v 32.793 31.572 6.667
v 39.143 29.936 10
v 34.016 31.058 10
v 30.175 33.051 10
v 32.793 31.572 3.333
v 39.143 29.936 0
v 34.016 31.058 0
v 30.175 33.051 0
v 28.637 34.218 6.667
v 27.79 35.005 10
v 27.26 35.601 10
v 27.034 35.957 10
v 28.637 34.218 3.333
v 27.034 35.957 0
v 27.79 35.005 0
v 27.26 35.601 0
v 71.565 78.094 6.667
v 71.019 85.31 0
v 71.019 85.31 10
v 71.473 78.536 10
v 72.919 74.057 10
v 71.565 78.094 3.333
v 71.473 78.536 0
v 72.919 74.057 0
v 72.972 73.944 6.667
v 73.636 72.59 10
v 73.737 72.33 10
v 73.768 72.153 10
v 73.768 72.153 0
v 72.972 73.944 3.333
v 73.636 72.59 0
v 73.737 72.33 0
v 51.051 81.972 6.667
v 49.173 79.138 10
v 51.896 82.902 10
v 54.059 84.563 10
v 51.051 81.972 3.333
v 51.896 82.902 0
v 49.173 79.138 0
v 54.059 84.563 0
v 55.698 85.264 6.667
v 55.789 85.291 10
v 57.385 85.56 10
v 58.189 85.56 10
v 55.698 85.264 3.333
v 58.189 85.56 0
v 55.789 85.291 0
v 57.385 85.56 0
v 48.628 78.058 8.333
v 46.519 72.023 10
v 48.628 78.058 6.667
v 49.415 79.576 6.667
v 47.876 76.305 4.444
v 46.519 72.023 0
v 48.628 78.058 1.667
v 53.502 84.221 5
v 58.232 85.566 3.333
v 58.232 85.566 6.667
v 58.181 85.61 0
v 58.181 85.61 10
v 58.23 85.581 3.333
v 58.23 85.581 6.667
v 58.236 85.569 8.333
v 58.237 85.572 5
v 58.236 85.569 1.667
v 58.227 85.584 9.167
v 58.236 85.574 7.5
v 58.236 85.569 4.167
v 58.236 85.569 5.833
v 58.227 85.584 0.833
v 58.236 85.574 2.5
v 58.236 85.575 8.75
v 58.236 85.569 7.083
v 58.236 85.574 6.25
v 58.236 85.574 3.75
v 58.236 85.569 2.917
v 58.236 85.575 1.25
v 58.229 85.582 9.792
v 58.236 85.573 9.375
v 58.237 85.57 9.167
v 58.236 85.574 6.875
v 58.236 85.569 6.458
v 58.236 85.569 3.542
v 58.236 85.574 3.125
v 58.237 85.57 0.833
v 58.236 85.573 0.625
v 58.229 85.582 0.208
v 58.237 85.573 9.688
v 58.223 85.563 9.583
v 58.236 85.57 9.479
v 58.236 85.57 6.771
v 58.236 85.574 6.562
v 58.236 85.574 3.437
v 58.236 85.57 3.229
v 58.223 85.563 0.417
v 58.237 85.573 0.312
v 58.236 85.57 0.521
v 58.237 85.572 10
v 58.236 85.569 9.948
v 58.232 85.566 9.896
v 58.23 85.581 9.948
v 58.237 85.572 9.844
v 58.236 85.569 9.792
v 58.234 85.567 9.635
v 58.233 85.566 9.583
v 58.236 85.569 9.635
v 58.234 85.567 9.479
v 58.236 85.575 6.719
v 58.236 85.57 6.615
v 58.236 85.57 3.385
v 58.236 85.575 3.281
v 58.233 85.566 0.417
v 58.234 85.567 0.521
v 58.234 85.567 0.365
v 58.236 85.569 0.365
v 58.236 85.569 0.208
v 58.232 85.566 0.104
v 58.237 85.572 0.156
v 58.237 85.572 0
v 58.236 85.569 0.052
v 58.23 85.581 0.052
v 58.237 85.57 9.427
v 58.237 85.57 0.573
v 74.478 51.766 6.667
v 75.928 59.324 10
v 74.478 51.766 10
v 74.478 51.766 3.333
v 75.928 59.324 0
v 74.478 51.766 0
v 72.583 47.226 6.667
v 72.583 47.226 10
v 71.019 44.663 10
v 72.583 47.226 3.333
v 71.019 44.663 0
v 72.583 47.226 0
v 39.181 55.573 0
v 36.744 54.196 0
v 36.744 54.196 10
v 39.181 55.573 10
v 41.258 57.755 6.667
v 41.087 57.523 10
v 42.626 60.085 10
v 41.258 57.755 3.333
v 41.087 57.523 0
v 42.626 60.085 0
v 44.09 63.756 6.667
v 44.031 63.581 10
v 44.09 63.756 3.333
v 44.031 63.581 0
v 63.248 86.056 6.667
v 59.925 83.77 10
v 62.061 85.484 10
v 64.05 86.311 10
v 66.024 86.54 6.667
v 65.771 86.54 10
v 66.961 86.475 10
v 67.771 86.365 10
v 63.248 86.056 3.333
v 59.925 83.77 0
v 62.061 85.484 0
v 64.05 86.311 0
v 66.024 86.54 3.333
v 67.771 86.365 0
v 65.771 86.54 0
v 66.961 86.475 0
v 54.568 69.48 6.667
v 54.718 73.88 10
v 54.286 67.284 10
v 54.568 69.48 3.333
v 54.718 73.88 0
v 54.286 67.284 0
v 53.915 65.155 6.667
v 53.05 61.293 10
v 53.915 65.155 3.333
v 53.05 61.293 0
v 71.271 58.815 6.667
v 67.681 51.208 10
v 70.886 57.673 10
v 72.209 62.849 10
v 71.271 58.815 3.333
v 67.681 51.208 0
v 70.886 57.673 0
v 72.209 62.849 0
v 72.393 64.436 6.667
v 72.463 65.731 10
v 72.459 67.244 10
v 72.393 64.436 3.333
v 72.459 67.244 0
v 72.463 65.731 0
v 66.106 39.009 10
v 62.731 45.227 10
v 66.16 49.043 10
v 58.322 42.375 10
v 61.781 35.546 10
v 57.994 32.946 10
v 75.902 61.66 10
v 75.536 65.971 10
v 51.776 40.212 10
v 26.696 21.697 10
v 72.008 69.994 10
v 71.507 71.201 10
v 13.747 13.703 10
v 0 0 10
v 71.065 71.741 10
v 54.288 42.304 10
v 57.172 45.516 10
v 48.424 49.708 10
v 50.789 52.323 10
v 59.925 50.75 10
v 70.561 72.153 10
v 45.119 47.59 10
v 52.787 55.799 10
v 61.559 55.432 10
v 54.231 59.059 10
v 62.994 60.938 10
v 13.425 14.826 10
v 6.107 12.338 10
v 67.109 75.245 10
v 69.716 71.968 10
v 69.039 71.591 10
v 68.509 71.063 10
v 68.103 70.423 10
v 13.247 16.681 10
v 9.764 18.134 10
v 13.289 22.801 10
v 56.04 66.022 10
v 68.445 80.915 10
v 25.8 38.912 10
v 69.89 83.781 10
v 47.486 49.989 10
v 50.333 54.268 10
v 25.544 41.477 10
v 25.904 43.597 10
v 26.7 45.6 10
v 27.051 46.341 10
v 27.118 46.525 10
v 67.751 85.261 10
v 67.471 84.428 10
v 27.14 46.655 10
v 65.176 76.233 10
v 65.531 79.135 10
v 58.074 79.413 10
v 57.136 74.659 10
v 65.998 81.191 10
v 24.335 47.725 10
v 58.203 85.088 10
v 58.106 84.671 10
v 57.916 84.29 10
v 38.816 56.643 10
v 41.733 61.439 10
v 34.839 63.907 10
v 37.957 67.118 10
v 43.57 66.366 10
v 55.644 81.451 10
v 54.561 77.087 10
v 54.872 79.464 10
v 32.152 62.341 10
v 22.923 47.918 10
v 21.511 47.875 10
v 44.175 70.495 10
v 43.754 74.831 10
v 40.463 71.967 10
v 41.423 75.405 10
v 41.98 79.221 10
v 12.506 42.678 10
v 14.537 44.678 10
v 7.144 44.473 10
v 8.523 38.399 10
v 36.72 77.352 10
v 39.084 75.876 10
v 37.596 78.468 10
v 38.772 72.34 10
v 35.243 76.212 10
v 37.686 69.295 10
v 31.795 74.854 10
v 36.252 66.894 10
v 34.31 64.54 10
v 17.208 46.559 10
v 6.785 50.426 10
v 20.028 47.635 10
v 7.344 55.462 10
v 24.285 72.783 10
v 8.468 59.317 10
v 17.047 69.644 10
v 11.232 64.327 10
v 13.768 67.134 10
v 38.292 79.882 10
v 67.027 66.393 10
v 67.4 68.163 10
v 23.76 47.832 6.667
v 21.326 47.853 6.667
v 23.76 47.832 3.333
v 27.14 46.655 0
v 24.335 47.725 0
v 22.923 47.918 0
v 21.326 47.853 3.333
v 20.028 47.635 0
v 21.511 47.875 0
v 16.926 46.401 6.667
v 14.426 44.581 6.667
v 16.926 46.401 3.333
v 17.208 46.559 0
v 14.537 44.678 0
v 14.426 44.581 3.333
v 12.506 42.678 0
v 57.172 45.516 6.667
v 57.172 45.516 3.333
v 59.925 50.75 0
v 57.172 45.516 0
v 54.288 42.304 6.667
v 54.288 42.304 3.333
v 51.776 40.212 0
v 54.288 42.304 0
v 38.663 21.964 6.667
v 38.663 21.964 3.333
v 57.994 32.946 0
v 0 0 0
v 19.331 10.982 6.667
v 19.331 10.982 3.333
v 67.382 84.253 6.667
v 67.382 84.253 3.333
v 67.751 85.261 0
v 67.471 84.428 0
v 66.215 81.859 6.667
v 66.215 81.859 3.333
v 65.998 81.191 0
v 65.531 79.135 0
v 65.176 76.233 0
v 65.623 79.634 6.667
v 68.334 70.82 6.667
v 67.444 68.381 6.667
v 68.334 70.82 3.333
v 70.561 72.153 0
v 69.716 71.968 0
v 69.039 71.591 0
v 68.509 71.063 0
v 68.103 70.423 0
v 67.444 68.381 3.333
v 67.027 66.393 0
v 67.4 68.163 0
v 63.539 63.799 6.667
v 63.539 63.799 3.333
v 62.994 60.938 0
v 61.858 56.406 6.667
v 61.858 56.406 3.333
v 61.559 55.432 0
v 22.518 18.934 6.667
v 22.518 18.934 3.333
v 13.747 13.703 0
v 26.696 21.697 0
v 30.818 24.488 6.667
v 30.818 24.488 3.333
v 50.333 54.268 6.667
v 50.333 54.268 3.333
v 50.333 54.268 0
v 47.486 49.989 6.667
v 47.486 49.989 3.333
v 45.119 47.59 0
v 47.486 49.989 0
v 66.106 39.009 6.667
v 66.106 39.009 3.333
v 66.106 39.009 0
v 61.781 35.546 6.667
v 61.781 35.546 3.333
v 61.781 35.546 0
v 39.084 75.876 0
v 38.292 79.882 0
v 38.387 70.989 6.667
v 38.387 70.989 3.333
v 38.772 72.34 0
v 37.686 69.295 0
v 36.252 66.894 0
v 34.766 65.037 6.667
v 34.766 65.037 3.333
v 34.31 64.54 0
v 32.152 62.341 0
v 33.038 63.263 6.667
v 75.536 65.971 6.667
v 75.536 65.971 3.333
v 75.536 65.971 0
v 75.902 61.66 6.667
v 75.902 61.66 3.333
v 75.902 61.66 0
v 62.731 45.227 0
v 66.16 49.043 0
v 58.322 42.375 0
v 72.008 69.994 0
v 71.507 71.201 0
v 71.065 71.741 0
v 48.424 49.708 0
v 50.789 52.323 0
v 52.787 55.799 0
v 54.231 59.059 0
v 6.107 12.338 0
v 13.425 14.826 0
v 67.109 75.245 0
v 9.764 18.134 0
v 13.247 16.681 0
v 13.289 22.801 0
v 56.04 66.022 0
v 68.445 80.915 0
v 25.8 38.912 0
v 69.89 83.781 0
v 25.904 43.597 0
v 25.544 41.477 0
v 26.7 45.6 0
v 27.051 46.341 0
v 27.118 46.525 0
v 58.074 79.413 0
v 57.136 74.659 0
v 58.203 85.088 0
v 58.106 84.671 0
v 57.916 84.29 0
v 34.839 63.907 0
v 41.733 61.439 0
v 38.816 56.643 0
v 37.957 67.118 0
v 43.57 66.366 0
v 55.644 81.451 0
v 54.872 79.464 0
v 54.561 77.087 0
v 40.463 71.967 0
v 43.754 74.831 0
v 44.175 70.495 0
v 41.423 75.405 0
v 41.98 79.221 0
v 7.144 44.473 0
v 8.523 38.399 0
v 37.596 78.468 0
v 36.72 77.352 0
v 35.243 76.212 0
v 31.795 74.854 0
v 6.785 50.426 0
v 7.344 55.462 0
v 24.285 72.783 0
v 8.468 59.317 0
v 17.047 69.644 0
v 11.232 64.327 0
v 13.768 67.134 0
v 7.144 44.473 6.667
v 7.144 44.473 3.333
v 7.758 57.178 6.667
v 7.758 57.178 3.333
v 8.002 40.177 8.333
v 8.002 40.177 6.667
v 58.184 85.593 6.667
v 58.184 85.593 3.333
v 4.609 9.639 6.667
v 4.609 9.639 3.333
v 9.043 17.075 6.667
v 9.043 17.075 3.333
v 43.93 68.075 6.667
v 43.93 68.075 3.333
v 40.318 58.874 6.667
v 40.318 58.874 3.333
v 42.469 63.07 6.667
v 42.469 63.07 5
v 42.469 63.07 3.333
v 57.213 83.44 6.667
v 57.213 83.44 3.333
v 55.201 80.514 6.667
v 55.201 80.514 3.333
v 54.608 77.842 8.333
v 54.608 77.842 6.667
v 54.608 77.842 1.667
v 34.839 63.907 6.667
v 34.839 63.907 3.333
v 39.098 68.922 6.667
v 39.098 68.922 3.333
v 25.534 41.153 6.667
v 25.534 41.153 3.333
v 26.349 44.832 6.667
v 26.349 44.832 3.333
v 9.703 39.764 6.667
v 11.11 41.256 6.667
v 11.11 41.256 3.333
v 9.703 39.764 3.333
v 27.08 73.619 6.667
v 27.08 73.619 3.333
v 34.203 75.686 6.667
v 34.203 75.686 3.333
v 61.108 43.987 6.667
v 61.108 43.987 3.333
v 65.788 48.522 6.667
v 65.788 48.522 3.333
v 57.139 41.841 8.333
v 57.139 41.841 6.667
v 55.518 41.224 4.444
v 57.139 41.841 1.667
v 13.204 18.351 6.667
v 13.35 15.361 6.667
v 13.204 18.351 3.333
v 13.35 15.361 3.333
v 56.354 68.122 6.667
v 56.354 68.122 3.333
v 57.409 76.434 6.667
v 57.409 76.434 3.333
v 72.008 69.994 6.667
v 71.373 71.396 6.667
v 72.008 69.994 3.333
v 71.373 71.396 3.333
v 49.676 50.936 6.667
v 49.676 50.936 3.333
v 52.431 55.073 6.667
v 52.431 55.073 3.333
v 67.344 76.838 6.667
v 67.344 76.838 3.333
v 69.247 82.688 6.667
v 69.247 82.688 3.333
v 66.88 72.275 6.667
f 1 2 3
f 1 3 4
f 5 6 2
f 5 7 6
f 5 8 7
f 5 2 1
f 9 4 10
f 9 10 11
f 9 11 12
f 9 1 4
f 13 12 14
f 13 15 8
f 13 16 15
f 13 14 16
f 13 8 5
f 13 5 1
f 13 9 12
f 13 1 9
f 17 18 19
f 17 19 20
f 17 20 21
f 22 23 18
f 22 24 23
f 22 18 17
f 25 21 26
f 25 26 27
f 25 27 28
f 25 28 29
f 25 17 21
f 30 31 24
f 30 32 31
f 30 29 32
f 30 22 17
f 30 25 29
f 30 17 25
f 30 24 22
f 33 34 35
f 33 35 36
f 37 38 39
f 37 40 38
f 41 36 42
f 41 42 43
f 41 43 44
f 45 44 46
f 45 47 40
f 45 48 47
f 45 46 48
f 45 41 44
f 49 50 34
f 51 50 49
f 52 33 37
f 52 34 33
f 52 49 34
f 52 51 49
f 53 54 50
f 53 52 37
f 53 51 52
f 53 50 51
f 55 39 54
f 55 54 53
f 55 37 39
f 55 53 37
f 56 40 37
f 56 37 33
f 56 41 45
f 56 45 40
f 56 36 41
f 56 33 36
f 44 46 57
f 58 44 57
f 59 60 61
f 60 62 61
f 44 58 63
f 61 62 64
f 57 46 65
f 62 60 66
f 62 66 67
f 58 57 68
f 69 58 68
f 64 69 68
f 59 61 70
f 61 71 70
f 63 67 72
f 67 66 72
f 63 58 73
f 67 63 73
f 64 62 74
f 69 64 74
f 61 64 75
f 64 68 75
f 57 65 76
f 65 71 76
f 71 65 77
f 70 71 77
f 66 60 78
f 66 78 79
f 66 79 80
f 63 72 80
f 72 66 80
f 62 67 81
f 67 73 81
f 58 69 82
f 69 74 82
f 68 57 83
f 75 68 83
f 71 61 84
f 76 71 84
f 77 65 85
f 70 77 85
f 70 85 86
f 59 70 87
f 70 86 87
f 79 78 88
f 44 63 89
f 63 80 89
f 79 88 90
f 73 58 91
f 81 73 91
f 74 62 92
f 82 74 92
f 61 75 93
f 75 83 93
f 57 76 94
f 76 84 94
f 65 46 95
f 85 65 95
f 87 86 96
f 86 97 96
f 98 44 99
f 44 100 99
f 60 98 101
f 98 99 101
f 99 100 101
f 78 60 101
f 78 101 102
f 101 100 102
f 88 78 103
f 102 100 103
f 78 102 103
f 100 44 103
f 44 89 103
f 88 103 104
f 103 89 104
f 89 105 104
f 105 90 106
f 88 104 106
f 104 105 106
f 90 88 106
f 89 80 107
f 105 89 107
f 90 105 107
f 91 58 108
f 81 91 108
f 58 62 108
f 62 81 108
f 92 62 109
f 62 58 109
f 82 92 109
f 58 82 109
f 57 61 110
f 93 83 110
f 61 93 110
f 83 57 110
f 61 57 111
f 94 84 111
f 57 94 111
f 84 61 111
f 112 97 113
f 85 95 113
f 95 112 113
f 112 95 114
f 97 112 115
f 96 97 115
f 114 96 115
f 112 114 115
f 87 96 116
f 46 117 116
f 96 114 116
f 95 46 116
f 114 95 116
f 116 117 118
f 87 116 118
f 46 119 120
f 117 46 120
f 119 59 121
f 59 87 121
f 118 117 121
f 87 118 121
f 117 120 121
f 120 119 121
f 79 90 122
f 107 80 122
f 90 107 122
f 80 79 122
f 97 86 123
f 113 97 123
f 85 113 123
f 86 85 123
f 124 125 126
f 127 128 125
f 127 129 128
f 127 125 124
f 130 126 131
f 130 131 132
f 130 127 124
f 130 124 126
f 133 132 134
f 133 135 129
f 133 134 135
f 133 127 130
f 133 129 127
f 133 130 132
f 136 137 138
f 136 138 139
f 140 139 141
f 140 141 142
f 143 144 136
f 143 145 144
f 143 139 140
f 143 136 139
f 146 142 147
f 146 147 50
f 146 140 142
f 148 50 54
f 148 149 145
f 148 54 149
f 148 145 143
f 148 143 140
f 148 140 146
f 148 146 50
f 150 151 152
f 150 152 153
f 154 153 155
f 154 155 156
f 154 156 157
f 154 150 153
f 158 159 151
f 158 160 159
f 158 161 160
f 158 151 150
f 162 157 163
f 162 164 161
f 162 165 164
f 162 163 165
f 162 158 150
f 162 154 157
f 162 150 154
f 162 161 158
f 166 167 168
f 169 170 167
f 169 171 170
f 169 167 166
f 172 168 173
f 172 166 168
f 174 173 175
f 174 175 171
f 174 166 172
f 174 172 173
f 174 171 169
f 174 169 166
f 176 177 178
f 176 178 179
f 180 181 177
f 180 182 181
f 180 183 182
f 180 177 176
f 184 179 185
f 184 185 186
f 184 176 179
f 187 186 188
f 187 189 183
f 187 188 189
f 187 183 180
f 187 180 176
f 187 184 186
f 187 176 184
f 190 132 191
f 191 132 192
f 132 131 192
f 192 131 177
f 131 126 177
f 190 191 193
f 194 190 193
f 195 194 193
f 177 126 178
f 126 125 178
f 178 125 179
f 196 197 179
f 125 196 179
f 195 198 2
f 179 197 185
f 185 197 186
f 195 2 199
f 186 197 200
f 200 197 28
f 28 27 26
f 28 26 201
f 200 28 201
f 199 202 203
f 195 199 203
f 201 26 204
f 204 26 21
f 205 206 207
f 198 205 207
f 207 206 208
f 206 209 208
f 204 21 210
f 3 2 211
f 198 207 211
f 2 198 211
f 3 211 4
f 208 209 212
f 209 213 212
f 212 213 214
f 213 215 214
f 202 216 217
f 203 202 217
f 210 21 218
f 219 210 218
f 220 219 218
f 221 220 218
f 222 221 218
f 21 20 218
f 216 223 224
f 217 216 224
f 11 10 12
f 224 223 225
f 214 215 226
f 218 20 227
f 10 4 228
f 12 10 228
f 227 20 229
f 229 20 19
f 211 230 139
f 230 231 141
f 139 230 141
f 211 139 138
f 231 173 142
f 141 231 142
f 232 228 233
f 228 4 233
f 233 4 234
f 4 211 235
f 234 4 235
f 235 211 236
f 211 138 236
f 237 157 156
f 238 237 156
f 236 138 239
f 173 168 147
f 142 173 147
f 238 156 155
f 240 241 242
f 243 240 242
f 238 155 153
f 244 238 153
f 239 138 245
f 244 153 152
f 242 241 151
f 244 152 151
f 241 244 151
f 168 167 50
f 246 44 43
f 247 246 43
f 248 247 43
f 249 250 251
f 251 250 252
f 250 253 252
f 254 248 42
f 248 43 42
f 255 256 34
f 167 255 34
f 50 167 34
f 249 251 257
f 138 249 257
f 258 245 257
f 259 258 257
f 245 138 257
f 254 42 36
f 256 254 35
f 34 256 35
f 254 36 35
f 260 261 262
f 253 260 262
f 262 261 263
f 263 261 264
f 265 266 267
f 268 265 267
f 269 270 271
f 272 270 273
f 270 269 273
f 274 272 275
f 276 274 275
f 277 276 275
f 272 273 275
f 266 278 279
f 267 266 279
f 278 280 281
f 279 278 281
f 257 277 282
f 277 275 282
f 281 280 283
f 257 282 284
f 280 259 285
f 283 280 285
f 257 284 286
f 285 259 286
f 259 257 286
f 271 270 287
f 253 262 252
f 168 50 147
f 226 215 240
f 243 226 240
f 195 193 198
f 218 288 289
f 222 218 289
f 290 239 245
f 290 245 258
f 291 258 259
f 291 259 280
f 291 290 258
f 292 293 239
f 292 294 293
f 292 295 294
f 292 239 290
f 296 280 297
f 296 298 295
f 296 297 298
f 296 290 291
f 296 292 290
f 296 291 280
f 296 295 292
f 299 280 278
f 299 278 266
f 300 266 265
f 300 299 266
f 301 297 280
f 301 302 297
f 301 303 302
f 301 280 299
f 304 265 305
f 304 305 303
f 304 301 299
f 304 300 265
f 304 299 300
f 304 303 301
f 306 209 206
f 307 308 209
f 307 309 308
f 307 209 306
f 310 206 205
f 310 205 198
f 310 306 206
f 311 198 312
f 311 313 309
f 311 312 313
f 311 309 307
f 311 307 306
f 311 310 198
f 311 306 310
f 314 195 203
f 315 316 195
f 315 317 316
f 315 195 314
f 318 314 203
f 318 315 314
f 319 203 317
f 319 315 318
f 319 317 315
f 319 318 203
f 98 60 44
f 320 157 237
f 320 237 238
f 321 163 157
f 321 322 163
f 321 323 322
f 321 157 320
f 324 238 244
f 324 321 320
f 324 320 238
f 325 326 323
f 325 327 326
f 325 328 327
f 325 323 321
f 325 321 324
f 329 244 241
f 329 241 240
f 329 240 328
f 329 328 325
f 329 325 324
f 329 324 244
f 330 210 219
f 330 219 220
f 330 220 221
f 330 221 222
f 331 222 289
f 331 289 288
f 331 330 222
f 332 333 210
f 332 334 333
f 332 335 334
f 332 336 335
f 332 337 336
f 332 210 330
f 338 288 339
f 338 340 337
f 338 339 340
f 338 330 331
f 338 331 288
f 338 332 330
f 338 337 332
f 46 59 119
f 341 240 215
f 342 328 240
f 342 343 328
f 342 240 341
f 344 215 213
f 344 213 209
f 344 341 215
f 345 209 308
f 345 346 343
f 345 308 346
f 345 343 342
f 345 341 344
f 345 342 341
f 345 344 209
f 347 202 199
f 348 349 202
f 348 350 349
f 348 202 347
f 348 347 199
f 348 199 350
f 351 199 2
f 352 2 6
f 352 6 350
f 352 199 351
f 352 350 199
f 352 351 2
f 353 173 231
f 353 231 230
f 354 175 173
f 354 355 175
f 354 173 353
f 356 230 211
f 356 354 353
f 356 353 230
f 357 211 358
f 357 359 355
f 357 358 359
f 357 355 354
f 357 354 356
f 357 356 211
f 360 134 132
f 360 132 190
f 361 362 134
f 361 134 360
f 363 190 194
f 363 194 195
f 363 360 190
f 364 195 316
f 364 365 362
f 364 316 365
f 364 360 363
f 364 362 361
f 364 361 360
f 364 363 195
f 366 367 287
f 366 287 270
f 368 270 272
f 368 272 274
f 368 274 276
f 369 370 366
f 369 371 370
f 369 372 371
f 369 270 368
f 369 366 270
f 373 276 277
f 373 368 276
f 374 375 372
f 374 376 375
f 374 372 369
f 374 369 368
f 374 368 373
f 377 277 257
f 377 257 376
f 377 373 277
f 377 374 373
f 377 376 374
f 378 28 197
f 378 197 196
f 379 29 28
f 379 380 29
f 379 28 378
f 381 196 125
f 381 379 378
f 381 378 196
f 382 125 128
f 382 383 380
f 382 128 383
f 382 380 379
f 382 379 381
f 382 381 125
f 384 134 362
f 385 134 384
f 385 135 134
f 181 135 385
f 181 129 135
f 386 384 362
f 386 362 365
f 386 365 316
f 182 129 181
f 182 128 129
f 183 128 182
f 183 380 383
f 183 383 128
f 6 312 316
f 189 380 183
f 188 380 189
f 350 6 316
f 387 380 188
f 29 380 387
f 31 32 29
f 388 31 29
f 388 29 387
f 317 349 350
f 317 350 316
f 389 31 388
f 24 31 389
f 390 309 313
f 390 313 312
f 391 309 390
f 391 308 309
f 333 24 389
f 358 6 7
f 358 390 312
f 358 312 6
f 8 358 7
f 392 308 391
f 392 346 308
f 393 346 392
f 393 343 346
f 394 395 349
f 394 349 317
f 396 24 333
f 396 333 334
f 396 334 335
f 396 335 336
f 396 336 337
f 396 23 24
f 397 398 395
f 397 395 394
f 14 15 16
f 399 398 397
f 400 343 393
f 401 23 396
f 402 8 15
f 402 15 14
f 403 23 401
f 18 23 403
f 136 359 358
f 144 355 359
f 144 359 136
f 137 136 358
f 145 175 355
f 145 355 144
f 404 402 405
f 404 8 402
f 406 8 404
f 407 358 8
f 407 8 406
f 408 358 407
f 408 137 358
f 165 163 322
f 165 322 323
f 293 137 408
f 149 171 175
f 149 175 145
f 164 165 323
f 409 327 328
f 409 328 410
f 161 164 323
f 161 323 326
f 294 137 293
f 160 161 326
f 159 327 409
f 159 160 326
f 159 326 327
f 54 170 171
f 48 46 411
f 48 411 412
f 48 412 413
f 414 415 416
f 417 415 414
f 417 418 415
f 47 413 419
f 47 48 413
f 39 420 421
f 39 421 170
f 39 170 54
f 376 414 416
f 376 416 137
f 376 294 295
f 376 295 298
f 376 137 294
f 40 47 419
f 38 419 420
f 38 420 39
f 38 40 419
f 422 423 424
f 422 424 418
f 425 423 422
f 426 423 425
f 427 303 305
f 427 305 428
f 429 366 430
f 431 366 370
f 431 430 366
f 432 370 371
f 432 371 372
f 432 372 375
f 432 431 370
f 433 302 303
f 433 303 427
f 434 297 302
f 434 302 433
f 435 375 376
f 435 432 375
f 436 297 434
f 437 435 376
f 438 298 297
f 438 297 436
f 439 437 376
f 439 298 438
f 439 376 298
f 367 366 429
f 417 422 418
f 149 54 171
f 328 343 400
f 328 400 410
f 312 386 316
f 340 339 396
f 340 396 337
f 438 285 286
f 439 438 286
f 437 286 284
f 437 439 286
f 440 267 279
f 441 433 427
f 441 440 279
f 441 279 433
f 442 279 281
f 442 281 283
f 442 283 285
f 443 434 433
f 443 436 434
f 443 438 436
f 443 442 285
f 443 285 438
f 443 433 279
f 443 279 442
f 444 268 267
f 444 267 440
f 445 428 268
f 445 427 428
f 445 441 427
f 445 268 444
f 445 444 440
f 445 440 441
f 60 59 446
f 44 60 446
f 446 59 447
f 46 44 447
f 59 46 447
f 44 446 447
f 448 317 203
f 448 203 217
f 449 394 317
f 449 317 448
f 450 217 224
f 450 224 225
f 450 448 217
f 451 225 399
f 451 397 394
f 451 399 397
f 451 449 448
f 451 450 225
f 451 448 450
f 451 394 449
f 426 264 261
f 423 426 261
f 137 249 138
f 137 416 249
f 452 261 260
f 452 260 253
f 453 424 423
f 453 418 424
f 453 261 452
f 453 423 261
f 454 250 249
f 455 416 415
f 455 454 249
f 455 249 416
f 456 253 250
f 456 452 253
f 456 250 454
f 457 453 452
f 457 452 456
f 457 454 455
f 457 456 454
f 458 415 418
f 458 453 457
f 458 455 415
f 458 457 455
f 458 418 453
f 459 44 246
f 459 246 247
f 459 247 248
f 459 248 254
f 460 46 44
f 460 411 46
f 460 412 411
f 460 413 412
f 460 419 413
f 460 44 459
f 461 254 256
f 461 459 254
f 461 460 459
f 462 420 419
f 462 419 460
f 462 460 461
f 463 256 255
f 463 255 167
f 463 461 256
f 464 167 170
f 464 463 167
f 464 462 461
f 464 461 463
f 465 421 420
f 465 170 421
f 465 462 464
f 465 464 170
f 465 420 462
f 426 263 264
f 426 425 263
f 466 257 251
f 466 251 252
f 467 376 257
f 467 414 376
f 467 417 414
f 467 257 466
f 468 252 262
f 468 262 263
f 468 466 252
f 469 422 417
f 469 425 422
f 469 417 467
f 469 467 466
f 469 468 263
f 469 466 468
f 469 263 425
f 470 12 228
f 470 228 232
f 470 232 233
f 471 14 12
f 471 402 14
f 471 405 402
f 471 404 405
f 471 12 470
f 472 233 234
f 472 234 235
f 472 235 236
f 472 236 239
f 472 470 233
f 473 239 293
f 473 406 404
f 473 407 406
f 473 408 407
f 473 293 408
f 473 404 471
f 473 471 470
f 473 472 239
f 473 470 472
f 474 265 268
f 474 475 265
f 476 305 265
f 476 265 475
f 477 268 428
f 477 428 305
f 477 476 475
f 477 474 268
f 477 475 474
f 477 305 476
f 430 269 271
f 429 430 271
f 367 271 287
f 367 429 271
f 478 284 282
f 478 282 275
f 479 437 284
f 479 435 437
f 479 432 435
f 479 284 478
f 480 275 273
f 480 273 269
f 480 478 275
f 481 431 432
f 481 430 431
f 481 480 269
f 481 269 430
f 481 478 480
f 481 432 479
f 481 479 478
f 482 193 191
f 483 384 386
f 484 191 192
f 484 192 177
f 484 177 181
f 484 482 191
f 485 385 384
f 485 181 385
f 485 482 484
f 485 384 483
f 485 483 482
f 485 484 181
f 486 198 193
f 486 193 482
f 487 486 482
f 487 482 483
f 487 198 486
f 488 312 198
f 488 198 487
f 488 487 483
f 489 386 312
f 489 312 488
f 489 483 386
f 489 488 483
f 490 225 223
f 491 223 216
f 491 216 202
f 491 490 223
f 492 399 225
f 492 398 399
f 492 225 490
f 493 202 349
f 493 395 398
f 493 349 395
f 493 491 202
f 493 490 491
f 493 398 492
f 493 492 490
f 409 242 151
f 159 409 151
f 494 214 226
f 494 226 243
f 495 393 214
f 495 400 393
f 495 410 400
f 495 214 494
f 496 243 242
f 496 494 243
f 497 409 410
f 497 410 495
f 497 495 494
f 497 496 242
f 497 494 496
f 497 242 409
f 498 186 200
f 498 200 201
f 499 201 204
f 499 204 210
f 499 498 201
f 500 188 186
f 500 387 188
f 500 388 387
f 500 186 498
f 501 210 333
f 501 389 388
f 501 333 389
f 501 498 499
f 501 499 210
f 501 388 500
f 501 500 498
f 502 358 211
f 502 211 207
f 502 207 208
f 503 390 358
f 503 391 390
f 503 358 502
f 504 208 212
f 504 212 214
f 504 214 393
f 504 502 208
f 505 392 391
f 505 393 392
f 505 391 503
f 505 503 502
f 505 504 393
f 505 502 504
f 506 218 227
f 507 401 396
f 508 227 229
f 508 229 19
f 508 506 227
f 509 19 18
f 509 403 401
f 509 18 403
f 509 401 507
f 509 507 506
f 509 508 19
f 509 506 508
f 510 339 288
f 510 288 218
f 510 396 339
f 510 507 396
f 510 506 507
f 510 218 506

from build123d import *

# Parameters (mm, degrees)
F1_DEPTH = 10


with BuildPart() as f1:
    # F0 (on Top) → F1 (new body)
    with BuildSketch(Plane.XY):
        with BuildLine():
            add(Edge.make_bspline(
                [(58.1812933087, 85.6097638607), (58.1841250991, 85.5931268886), (58.1867527565, 85.5766102474), (58.1891789105, 85.5602109613)],
                knots=[0, 0, 0, 0, 0.0742411452, 0.0742411452, 0.0742411452, 0.0742411452], degree=3))
            add(Edge.make_bspline(
                [(58.18917891, 85.5602109561), (58.2536253791, 85.5619678043), (58.2542100908, 85.5733054697), (58.1812933087, 85.6097638607)],
                knots=[16.3065114736, 16.3065114736, 16.3065114736, 16.3065114736, 17.90581899, 17.90581899, 17.90581899, 17.90581899], degree=3))
        make_face()
    extrude(amount=F1_DEPTH)


with BuildPart() as f1b:
    # F0 (on Top) → F1, piece 2 (new body)
    with BuildSketch(Plane.XY):
        with BuildLine():
            add(Edge.make_bspline(
                [(8.5230357945, 38.3988320827), (8.3760647103, 38.8663448393), (1.192909549, 59.588778764), (17.0468091965, 69.6442350745)],
                knots=[0, 0, 0, 0, 32.3871876075, 32.3871876075, 32.3871876075, 32.3871876075], degree=3))
            add(Edge.make_bspline(
                [(12.5055862591, 42.6780767739), (11.1939450726, 41.3559849064), (9.5115192235, 39.6344363689), (8.5230357945, 38.3988320827)],
                knots=[0, 0, 0, 0, 5.845737193, 5.845737193, 5.845737193, 5.845737193], degree=3))
            add(Edge.make_bspline(
                [(20.0279317796, 47.6346611977), (16.6162457317, 46.8627214432), (14.1450371593, 44.4532930851), (12.5055862591, 42.6780767739)],
                knots=[0, 0, 0, 0, 9.0085188172, 9.0085188172, 9.0085188172, 9.0085188172], degree=3))
            add(Edge.make_bspline(
                [(27.1397791803, 46.655099839), (23.3502890915, 48.7161278725), (20.6937398762, 47.6658642292), (20.0279317796, 47.6346611977)],
                knots=[0, 0, 0, 0, 7.1789911482, 7.1789911482, 7.1789911482, 7.1789911482], degree=3))
            add(Edge.make_bspline(
                [(27.0342063159, 35.9573215246), (23.5974099487, 41.7967438698), (27.1397791803, 45.8742380142), (27.1397791803, 46.655099839)],
                knots=[0, 0, 0, 0, 10.6982992337, 10.6982992337, 10.6982992337, 10.6982992337], degree=3))
            add(Edge.make_bspline(
                [(39.1431711614, 29.9355648458), (31.8141803145, 30.4291844368), (27.242442593, 35.3098213673), (27.0342063159, 35.9573215246)],
                knots=[0, 0, 0, 0, 13.5236305454, 13.5236305454, 13.5236305454, 13.5236305454], degree=3))
            add(Edge.make_bspline(
                [(13.74707371, 13.703007251), (22.9178294539, 18.6291635036), (30.6403562427, 24.683624506), (39.1431711614, 29.9355648458)],
                knots=[0, 0, 0, 0, 30.1406319083, 30.1406319083, 30.1406319083, 30.1406319083], degree=3))
            add(Edge.make_bspline(
                [(13.2888965309, 22.8010956198), (13.0947744474, 17.5788998604), (13.218334876, 14.7370090708), (13.74707371, 13.703007251)],
                knots=[0, 0, 0, 0, 9.1096179005, 9.1096179005, 9.1096179005, 9.1096179005], degree=3))
            add(Edge.make_bspline(
                [(0, 0), (4.6926648356, 10.9066357836), (9.1408407316, 17.7642405033), (13.2888965309, 22.8010956198)],
                knots=[0, 0, 0, 0, 26.390997186, 26.390997186, 26.390997186, 26.390997186], degree=3))
            add(Edge.make_bspline(
                [(57.9938851297, 32.9464413226), (38.6625900865, 21.964294215), (19.3312950432, 10.9821471075), (0, 0)],
                knots=[0, 0, 0, 0, 66.6990157968, 66.6990157968, 66.6990157968, 66.6990157968], degree=3))
            add(Edge.make_bspline(
                [(71.0192099214, 44.6626804769), (65.7932981849, 37.4721288681), (61.5304671228, 35.5569422245), (57.9938851297, 32.9464413226)],
                knots=[0, 0, 0, 0, 17.5193991293, 17.5193991293, 17.5193991293, 17.5193991293], degree=3))
            add(Edge.make_bspline(
                [(75.9282484651, 59.3243427575), (74.9585479498, 49.9088577926), (72.1595361829, 46.5850308537), (71.0192099214, 44.6626804769)],
                knots=[0, 0, 0, 0, 15.4616622733, 15.4616622733, 15.4616622733, 15.4616622733], degree=3))
            add(Edge.make_bspline(
                [(73.7682729959, 72.1533000469), (76.5913054347, 65.0701671839), (75.7166147232, 60.6384053826), (75.9282484651, 59.3243427575)],
                knots=[0, 0, 0, 0, 13.0095210966, 13.0095210966, 13.0095210966, 13.0095210966], degree=3))
            add(Edge.make_bspline(
                [(71.0192099214, 85.3095278144), (70.6434100866, 76.3245373964), (73.7682729959, 73.0007141829), (73.7682729959, 72.1533000469)],
                knots=[0, 0, 0, 0, 13.4403748779, 13.4403748779, 13.4403748779, 13.4403748779], degree=3))
            add(Edge.make_bspline(
                [(67.0265257359, 66.3933604956), (65.9783929586, 79.5900523663), (69.8853433132, 83.8468819857), (71.0192099214, 85.3095278144)],
                knots=[0, 0, 0, 0, 19.3329488966, 19.3329488966, 19.3329488966, 19.3329488966], degree=3))
            add(Edge.make_bspline(
                [(70.5610364676, 72.1533000469), (67.3779025674, 71.8927681446), (67.4945265055, 67.6359385252), (67.0265257359, 66.3933604956)],
                knots=[0, 0, 0, 0, 6.7579338372, 6.7579338372, 6.7579338372, 6.7579338372], degree=3))
            add(Edge.make_bspline(
                [(72.4591985345, 67.2442615032), (72.1012353897, 70.901453495), (71.4597925544, 71.484580636), (70.5610364676, 72.1533000469)],
                knots=[0, 0, 0, 0, 5.2632384191, 5.2632384191, 5.2632384191, 5.2632384191], degree=3))
            add(Edge.make_bspline(
                [(67.6810666919, 51.2080676854), (72.9759261012, 59.530466795), (72.451107204, 66.119812429), (72.4591985345, 67.2442615032)],
                knots=[0, 0, 0, 0, 16.7329033963, 16.7329033963, 16.7329033963, 16.7329033963], degree=3))
            add(Edge.make_bspline(
                [(51.7757683992, 40.2118265629), (64.0540644526, 42.7363924682), (66.5615200996, 50.3170527518), (67.6810666919, 51.2080676854)],
                knots=[0, 0, 0, 0, 19.3363862343, 19.3363862343, 19.3363862343, 19.3363862343], degree=3))
            add(Edge.make_bspline(
                [(59.9251538515, 50.7499016821), (57.4048087001, 44.2045032978), (53.9357513189, 42.0445278287), (51.7757683992, 40.2118265629)],
                knots=[0, 0, 0, 0, 13.3215430964, 13.3215430964, 13.3215430964, 13.3215430964], degree=3))
            add(Edge.make_bspline(
                [(65.1764720678, 76.2328207493), (63.4920150042, 60.1752474904), (62.0520301163, 56.6407367587), (59.9251538515, 50.7499016821)],
                knots=[0, 0, 0, 0, 26.0183686497, 26.0183686497, 26.0183686497, 26.0183686497], degree=3))
            add(Edge.make_bspline(
                [(67.7712410688, 86.3647758961), (68.0737867951, 83.4113657475), (65.8483505249, 84.4586268067), (65.1764720678, 76.2328207493)],
                knots=[0, 0, 0, 0, 10.4589359528, 10.4589359528, 10.4589359528, 10.4589359528], degree=3))
            add(Edge.make_bspline(
                [(59.9251538515, 83.7700068951), (63.3611083031, 87.3385965824), (66.6992515326, 86.4877030253), (67.7712410688, 86.3647758961)],
                knots=[0, 0, 0, 0, 8.2640129955, 8.2640129955, 8.2640129955, 8.2640129955], degree=3))
            add(Edge.make_bspline(
                [(54.2313084006, 59.0591914952), (57.7320754528, 68.4224367142), (55.8339133859, 76.9968926907), (59.9251538515, 83.7700068951)],
                knots=[0, 0, 0, 0, 25.3583176442, 25.3583176442, 25.3583176442, 25.3583176442], degree=3))
            add(Edge.make_bspline(
                [(45.1192297041, 47.5898385048), (50.8594214916, 50.2262599766), (52.6266731322, 55.4625689983), (54.2313084006, 59.0591914952)],
                knots=[0, 0, 0, 0, 14.6484141186, 14.6484141186, 14.6484141186, 14.6484141186], degree=3))
            add(Edge.make_bspline(
                [(53.0497655272, 61.2933374941), (50.6006330252, 52.6047423482), (47.0435544848, 49.3392273784), (45.1192297041, 47.5898385048)],
                knots=[0, 0, 0, 0, 15.8328545434, 15.8328545434, 15.8328545434, 15.8328545434], degree=3))
            add(Edge.make_bspline(
                [(54.7181718917, 73.8801862118), (54.9157783389, 69.5737600327), (53.924459964, 64.792111516), (53.0497655272, 61.2933374941)],
                knots=[0, 0, 0, 0, 12.6969421688, 12.6969421688, 12.6969421688, 12.6969421688], degree=3))
            add(Edge.make_bspline(
                [(58.1891789105, 85.5602109613), (58.5864258891, 82.875069452), (53.5815226929, 83.3361278309), (54.7181718917, 73.8801862118)],
                knots=[0.0742411452, 0.0742411452, 0.0742411452, 0.0742411452, 12.2301349858, 12.2301349858, 12.2301349858, 12.2301349858], degree=3))
            add(Edge.make_bspline(
                [(46.5187430382, 72.0228850842), (50.2360443913, 86.5203885195), (57.5320838377, 85.542298162), (58.18917891, 85.5602109561)],
                knots=[0, 0, 0, 0, 16.3065114736, 16.3065114736, 16.3065114736, 16.3065114736], degree=3))
            add(Edge.make_bspline(
                [(36.7442097465, 54.1963754503), (42.525184556, 56.4760852712), (43.8662123039, 62.6813942342), (46.5187430382, 72.0228850842)],
                knots=[0.2281459231, 0.2281459231, 0.2281459231, 0.2281459231, 20.491775236, 20.491775236, 20.491775236, 20.491775236], degree=3))
            add(Edge.make_bspline(
                [(41.979894042, 79.2211890221), (48.5770784859, 67.9632438107), (38.4334059964, 55.7515616584), (36.7442097465, 54.1963754503)],
                knots=[0, 0, 0, 0, 22.9072254799, 22.9072254799, 22.9072254799, 22.9072254799], degree=3))
            add(Edge.make_bspline(
                [(32.1521687688, 62.3412363997), (33.0705456357, 62.7932086076), (40.7698605571, 65.6684161963), (41.979894042, 79.2211890221)],
                knots=[2.0426097474, 2.0426097474, 2.0426097474, 2.0426097474, 19.6072770162, 19.6072770162, 19.6072770162, 19.6072770162], degree=3))
            add(Edge.make_bspline(
                [(38.2922179997, 79.8816606402), (41.818916673, 69.622180824), (32.6877412687, 63.3053088898), (32.1521687688, 62.3412363997)],
                knots=[0, 0, 0, 0, 18.1162174826, 18.1162174826, 18.1162174826, 18.1162174826], degree=3))
            add(Edge.make_bspline(
                [(17.0468091965, 69.6442350745), (28.495112434, 75.9187862277), (35.7603803277, 73.2768699527), (38.2922179997, 79.8816606402)],
                knots=[0, 0, 0, 0, 23.5833050574, 23.5833050574, 23.5833050574, 23.5833050574], degree=3))
        make_face()
        with BuildLine():
            add(Edge.make_bspline(
                [(36.5472510457, 54.1208684444), (36.6134722373, 54.1455390763), (36.6791224014, 54.1707084538), (36.7442097465, 54.1963754503)],
                knots=[0, 0, 0, 0, 0.2281459231, 0.2281459231, 0.2281459231, 0.2281459231], degree=3))
            add(Edge.make_bspline(
                [(36.7442097465, 54.1963754503), (36.5396322565, 54.0080278317), (36.4590606191, 53.9759841434), (36.5472510457, 54.1208684444)],
                knots=[22.9072254799, 22.9072254799, 22.9072254799, 22.9072254799, 25.6815050771, 25.6815050771, 25.6815050771, 25.6815050771], degree=3))
        make_face(mode=Mode.SUBTRACT)
        with BuildLine():
            add(Edge.make_bspline(
                [(32.1277491748, 62.2688867152), (32.0302735557, 62.2688867152), (32.0453699601, 62.2886761762), (32.1521687688, 62.3412363997)],
                knots=[0, 0, 0, 0, 2.0426097474, 2.0426097474, 2.0426097474, 2.0426097474], degree=3))
            add(Edge.make_bspline(
                [(32.1521687688, 62.3412363997), (32.1360810553, 62.3122772539), (32.1277491748, 62.288147952), (32.1277491748, 62.2688867152)],
                knots=[18.1162174826, 18.1162174826, 18.1162174826, 18.1162174826, 18.6603987425, 18.6603987425, 18.6603987425, 18.6603987425], degree=3))
        make_face(mode=Mode.SUBTRACT)
        with BuildLine():
            add(Edge.make_bspline(
                [(36.7442097465, 54.1963754503), (36.5396322565, 54.0080278317), (36.4590606191, 53.9759841434), (36.5472510457, 54.1208684444)],
                knots=[22.9072254799, 22.9072254799, 22.9072254799, 22.9072254799, 25.6815050771, 25.6815050771, 25.6815050771, 25.6815050771], degree=3))
            add(Edge.make_bspline(
                [(36.5472510457, 54.1208684444), (36.6134722373, 54.1455390763), (36.6791224014, 54.1707084538), (36.7442097465, 54.1963754503)],
                knots=[0, 0, 0, 0, 0.2281459231, 0.2281459231, 0.2281459231, 0.2281459231], degree=3))
        make_face()
        with BuildLine():
            add(Edge.make_bspline(
                [(32.1521687688, 62.3412363997), (32.1360810553, 62.3122772539), (32.1277491748, 62.288147952), (32.1277491748, 62.2688867152)],
                knots=[18.1162174826, 18.1162174826, 18.1162174826, 18.1162174826, 18.6603987425, 18.6603987425, 18.6603987425, 18.6603987425], degree=3))
            add(Edge.make_bspline(
                [(32.1277491748, 62.2688867152), (32.0302735557, 62.2688867152), (32.0453699601, 62.2886761762), (32.1521687688, 62.3412363997)],
                knots=[0, 0, 0, 0, 2.0426097474, 2.0426097474, 2.0426097474, 2.0426097474], degree=3))
        make_face()
    extrude(amount=F1_DEPTH)


solid = Compound([f1.part, f1b.part])
